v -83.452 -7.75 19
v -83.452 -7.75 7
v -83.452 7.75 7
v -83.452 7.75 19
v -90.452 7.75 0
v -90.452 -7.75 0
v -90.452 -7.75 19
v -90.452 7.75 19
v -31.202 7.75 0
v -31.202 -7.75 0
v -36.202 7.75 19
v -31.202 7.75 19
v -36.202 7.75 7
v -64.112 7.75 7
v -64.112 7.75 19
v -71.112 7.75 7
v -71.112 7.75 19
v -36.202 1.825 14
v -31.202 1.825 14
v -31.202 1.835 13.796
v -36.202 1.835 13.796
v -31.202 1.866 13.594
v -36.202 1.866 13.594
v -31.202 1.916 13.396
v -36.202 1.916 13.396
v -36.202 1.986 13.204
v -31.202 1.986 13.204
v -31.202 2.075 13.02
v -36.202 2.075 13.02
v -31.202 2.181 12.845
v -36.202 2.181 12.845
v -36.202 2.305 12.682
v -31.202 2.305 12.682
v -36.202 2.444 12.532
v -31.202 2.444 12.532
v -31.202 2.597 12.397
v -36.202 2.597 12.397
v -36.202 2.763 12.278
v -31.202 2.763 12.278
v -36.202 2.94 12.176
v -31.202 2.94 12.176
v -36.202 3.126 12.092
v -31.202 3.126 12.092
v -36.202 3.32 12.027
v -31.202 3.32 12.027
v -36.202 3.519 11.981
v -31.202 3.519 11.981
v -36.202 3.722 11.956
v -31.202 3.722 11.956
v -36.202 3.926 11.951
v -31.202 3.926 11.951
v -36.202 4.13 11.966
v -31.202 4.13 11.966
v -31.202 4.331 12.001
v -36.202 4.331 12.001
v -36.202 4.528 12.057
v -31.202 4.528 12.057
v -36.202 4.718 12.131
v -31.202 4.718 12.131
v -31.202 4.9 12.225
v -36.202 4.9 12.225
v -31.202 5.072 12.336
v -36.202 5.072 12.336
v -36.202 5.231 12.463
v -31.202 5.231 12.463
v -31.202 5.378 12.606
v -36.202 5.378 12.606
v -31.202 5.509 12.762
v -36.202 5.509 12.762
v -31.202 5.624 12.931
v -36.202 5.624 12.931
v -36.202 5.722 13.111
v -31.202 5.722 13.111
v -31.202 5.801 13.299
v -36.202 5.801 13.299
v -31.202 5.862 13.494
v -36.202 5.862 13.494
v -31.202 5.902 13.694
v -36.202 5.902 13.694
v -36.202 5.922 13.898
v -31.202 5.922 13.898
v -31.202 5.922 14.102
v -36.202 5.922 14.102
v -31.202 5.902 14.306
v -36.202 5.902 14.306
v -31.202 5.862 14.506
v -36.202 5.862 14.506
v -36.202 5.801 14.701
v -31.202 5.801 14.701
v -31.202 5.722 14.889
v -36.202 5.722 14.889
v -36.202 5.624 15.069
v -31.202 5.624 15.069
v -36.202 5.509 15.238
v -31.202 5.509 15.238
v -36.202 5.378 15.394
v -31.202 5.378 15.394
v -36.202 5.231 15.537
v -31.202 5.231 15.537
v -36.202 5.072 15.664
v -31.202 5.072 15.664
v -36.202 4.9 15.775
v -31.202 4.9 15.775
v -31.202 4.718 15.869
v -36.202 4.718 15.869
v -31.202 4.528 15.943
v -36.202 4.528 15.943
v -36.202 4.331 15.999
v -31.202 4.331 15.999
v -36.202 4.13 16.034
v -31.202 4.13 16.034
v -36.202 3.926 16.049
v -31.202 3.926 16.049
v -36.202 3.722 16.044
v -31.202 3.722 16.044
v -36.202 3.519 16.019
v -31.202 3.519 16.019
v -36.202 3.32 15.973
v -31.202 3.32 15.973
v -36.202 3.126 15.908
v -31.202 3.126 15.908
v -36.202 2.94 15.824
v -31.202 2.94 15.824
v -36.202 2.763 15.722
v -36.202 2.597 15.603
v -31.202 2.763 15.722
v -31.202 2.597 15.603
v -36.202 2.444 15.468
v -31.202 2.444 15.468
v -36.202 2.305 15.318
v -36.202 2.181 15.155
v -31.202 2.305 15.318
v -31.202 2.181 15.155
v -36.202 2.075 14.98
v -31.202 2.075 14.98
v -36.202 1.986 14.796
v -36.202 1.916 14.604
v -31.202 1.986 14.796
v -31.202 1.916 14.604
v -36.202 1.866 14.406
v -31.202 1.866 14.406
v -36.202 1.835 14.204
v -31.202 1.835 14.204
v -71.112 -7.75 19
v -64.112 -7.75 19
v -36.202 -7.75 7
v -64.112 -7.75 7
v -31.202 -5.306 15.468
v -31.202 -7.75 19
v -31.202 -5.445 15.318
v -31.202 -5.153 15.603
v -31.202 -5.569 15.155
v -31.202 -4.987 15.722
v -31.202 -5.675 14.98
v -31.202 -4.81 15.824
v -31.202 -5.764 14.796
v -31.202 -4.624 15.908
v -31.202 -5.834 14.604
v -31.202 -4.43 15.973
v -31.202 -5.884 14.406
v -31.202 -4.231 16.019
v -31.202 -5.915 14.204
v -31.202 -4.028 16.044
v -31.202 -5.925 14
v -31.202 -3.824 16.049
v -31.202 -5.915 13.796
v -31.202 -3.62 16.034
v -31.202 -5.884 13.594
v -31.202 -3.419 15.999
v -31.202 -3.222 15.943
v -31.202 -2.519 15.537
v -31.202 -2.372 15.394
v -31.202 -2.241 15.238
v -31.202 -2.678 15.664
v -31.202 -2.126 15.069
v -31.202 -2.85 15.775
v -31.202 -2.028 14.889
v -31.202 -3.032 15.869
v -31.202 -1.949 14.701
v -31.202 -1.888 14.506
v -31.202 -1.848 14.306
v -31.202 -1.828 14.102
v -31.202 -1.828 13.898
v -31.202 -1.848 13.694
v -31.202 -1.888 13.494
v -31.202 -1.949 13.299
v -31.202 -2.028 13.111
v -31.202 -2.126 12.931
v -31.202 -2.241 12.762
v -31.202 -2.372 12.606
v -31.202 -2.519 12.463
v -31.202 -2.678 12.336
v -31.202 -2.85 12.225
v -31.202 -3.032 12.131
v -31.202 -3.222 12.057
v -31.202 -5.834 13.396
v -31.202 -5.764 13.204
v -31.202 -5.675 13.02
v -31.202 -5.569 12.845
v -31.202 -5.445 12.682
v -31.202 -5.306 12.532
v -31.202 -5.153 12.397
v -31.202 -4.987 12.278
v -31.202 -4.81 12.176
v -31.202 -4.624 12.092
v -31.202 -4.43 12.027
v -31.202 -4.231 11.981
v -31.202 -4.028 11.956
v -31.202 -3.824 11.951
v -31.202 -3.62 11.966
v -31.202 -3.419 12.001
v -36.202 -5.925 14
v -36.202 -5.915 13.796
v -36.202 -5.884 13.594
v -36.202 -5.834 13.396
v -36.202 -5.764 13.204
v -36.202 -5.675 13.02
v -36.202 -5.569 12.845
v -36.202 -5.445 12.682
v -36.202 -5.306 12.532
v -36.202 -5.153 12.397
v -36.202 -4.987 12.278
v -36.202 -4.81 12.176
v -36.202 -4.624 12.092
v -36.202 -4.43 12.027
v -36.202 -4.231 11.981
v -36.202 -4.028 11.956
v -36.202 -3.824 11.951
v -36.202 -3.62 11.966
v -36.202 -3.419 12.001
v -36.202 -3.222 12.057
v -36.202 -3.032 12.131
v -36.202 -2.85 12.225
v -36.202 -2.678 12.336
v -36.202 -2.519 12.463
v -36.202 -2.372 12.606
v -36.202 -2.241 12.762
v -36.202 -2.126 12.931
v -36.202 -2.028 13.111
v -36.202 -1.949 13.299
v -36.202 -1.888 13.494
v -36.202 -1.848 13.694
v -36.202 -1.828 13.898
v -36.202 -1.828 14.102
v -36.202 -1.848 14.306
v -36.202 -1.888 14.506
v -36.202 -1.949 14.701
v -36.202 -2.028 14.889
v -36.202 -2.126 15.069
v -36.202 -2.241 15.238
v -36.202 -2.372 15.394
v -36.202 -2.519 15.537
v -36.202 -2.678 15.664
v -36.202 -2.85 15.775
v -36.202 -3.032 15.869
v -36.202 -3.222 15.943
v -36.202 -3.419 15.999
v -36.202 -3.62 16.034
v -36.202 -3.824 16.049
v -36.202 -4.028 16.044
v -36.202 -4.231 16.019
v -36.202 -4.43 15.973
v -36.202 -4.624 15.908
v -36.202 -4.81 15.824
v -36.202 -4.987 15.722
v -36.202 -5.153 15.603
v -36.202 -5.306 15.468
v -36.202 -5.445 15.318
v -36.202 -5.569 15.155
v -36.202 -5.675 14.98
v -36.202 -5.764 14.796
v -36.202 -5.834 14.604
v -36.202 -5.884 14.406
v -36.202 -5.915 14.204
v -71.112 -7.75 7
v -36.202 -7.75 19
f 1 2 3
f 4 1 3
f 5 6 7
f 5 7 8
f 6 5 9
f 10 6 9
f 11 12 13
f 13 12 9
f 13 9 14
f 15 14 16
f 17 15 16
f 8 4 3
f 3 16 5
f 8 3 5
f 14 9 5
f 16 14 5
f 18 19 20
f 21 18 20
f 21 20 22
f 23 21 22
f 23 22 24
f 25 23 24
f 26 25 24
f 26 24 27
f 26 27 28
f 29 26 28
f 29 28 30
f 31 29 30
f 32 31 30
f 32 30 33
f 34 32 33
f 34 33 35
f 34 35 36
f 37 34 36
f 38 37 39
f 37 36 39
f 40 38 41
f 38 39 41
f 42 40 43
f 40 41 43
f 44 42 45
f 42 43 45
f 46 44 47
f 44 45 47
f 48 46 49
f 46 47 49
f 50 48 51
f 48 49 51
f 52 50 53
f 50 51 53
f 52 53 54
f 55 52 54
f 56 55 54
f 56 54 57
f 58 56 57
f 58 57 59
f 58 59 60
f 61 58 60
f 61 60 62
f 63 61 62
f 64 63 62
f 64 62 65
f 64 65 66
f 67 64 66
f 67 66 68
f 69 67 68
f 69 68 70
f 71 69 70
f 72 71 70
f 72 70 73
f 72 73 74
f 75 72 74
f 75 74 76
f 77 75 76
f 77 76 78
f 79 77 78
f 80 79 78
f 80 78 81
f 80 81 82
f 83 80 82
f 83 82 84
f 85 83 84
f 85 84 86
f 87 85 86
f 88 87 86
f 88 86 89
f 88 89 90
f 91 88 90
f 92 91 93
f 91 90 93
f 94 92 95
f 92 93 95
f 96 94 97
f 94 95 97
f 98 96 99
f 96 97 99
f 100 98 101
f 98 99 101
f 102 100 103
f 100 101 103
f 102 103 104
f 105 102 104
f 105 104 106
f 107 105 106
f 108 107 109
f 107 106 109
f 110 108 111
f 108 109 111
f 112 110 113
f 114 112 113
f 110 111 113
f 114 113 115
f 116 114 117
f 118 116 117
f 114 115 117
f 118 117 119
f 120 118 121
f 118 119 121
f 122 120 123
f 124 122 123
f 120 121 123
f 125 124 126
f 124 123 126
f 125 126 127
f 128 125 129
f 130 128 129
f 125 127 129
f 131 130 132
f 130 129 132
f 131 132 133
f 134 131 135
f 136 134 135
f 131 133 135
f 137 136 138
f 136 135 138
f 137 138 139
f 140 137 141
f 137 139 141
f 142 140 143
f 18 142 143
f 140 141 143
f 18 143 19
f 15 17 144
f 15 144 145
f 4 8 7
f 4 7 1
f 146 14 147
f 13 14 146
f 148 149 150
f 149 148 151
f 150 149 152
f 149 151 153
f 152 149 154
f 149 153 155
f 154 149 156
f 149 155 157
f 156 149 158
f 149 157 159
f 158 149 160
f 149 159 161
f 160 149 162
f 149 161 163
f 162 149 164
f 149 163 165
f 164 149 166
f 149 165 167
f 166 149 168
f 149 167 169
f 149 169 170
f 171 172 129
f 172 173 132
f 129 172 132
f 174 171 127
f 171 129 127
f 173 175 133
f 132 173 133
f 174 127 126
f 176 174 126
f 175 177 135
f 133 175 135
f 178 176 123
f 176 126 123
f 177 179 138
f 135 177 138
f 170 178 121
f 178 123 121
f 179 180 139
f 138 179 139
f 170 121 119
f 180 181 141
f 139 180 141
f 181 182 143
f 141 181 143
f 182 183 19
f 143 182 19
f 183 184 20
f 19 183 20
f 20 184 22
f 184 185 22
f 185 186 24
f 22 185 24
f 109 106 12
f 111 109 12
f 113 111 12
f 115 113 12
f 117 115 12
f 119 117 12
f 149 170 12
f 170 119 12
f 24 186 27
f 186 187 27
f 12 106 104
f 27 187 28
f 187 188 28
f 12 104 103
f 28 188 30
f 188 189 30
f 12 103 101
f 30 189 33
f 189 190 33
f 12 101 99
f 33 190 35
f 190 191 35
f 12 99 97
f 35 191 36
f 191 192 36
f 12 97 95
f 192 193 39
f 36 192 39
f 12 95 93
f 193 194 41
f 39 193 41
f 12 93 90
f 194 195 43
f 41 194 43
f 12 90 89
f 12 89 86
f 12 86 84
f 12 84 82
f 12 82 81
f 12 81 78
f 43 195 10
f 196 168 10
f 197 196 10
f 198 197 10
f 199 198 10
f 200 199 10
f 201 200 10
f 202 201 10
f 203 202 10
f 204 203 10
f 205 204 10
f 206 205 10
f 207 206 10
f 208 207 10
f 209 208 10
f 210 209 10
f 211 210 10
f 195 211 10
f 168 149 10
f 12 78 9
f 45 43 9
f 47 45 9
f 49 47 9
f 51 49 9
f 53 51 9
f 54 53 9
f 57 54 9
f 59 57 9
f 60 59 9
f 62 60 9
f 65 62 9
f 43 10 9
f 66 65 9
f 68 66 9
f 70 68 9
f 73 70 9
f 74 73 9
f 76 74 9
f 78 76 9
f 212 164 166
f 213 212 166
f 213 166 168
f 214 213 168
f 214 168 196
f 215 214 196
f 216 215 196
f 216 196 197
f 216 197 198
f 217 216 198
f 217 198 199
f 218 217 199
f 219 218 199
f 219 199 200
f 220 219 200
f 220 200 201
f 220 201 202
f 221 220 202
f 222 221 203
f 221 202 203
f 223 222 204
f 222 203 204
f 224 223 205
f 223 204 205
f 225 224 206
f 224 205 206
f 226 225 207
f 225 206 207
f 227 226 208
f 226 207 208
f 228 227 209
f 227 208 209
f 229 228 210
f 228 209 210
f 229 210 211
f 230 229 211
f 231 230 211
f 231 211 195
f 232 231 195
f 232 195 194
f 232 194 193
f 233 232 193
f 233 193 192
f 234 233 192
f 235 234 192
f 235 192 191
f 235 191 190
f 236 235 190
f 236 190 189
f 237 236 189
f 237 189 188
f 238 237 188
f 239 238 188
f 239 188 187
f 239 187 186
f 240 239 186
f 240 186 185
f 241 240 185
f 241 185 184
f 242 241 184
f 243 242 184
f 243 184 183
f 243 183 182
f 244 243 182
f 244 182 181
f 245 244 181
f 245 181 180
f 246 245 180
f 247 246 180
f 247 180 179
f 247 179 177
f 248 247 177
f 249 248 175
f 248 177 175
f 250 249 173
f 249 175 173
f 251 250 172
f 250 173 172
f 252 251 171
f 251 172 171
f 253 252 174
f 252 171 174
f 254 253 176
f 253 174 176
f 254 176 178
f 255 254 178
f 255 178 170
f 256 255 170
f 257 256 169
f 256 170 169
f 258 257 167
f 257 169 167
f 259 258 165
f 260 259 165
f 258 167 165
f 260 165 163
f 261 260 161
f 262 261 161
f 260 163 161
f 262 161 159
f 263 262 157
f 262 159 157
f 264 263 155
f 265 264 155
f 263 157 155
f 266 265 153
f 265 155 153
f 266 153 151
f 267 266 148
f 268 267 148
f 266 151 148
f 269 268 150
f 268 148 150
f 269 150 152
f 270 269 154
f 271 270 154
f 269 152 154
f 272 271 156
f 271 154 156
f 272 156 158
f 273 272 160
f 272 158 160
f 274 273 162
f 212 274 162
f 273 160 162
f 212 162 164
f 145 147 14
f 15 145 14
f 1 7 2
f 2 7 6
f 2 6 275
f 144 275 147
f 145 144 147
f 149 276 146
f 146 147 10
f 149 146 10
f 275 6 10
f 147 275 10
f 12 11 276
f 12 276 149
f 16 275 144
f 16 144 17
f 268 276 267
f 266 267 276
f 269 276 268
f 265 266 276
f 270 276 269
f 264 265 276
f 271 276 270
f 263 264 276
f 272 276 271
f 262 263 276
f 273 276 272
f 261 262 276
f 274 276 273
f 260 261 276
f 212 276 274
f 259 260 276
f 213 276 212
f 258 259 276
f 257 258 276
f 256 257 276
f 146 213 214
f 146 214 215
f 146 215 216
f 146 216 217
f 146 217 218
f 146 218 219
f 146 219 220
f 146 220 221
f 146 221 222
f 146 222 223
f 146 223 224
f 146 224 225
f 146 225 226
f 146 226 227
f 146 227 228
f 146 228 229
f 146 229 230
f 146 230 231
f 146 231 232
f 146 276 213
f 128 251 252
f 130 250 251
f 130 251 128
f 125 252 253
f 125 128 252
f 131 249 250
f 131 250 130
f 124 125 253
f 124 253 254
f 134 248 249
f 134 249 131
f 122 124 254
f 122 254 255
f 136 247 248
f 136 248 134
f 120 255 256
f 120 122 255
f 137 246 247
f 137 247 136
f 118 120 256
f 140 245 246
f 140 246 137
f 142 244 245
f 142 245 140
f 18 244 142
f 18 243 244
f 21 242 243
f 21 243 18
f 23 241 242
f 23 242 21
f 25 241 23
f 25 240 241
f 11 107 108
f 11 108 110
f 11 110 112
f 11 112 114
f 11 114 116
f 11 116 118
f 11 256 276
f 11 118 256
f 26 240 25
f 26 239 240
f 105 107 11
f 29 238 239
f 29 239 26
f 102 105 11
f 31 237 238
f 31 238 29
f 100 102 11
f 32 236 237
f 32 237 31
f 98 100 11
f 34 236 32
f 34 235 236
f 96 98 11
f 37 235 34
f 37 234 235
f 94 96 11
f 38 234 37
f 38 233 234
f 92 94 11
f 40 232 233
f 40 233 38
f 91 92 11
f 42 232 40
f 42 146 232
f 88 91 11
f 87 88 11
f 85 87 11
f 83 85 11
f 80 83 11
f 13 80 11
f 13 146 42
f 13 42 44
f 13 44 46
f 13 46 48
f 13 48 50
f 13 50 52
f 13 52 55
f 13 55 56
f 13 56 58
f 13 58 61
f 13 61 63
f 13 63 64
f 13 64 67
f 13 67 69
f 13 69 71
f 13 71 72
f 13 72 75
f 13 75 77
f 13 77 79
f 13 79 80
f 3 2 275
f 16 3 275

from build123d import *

# Parameters (mm, degrees)
F0_W     = 7
F0_H     = 15.5
F0_W_2   = 12.34
F0_W_3   = 27.91
F0_W_4   = 5
F1_DEPTH = 7
F2_DEPTH = 19
F4_DEPTH = 25


with BuildPart() as f1:
    # F0 (on Top) → F1 (new body)
    with BuildSketch(Plane.XY):
        with Locations((-86.9522068564, 0)):
            Rectangle(F0_W, F0_H)
        with Locations((-77.2822068564, 0)):
            Rectangle(F0_W_2, F0_H)
        with Locations((-67.6122068564, 0)):
            Rectangle(F0_W, F0_H)
        with Locations((-50.1572068564, 0)):
            Rectangle(F0_W_3, F0_H)
        with Locations((-33.7022068564, 0)):
            Rectangle(F0_W_4, F0_H)
    extrude(amount=F1_DEPTH)

    # F0 (on Top) → F2 (join)
    with BuildSketch(Plane.XY):
        with Locations((-86.9522068564, 0)):
            Rectangle(F0_W, F0_H)
        with Locations((-67.6122068564, 0)):
            Rectangle(F0_W, F0_H)
        with Locations((-33.7022068564, 0)):
            Rectangle(F0_W_4, F0_H)
    extrude(amount=F2_DEPTH)

    # F3 (on face) → F4 (cut)
    with BuildSketch(Plane.YZ.offset(-31.2022068564)):
        with BuildLine():
            Line((-5.925, 14), (-1.825, 14))
            ThreePointArc((-1.825, 14), (-3.875, 16.05), (-5.925, 14))
        make_face()
        with BuildLine():
            ThreePointArc((5.925, 14), (3.875, 16.05), (1.825, 14))
            Line((1.825, 14), (5.925, 14))
        make_face()
        with BuildLine():
            Line((5.925, 14), (1.825, 14))
            ThreePointArc((1.825, 14), (3.875, 11.95), (5.925, 14))
        make_face()
        with BuildLine():
            ThreePointArc((-5.925, 14), (-3.875, 11.95), (-1.825, 14))
            Line((-1.825, 14), (-5.925, 14))
        make_face()
    extrude(amount=-F4_DEPTH, mode=Mode.SUBTRACT)


solid = f1.part
